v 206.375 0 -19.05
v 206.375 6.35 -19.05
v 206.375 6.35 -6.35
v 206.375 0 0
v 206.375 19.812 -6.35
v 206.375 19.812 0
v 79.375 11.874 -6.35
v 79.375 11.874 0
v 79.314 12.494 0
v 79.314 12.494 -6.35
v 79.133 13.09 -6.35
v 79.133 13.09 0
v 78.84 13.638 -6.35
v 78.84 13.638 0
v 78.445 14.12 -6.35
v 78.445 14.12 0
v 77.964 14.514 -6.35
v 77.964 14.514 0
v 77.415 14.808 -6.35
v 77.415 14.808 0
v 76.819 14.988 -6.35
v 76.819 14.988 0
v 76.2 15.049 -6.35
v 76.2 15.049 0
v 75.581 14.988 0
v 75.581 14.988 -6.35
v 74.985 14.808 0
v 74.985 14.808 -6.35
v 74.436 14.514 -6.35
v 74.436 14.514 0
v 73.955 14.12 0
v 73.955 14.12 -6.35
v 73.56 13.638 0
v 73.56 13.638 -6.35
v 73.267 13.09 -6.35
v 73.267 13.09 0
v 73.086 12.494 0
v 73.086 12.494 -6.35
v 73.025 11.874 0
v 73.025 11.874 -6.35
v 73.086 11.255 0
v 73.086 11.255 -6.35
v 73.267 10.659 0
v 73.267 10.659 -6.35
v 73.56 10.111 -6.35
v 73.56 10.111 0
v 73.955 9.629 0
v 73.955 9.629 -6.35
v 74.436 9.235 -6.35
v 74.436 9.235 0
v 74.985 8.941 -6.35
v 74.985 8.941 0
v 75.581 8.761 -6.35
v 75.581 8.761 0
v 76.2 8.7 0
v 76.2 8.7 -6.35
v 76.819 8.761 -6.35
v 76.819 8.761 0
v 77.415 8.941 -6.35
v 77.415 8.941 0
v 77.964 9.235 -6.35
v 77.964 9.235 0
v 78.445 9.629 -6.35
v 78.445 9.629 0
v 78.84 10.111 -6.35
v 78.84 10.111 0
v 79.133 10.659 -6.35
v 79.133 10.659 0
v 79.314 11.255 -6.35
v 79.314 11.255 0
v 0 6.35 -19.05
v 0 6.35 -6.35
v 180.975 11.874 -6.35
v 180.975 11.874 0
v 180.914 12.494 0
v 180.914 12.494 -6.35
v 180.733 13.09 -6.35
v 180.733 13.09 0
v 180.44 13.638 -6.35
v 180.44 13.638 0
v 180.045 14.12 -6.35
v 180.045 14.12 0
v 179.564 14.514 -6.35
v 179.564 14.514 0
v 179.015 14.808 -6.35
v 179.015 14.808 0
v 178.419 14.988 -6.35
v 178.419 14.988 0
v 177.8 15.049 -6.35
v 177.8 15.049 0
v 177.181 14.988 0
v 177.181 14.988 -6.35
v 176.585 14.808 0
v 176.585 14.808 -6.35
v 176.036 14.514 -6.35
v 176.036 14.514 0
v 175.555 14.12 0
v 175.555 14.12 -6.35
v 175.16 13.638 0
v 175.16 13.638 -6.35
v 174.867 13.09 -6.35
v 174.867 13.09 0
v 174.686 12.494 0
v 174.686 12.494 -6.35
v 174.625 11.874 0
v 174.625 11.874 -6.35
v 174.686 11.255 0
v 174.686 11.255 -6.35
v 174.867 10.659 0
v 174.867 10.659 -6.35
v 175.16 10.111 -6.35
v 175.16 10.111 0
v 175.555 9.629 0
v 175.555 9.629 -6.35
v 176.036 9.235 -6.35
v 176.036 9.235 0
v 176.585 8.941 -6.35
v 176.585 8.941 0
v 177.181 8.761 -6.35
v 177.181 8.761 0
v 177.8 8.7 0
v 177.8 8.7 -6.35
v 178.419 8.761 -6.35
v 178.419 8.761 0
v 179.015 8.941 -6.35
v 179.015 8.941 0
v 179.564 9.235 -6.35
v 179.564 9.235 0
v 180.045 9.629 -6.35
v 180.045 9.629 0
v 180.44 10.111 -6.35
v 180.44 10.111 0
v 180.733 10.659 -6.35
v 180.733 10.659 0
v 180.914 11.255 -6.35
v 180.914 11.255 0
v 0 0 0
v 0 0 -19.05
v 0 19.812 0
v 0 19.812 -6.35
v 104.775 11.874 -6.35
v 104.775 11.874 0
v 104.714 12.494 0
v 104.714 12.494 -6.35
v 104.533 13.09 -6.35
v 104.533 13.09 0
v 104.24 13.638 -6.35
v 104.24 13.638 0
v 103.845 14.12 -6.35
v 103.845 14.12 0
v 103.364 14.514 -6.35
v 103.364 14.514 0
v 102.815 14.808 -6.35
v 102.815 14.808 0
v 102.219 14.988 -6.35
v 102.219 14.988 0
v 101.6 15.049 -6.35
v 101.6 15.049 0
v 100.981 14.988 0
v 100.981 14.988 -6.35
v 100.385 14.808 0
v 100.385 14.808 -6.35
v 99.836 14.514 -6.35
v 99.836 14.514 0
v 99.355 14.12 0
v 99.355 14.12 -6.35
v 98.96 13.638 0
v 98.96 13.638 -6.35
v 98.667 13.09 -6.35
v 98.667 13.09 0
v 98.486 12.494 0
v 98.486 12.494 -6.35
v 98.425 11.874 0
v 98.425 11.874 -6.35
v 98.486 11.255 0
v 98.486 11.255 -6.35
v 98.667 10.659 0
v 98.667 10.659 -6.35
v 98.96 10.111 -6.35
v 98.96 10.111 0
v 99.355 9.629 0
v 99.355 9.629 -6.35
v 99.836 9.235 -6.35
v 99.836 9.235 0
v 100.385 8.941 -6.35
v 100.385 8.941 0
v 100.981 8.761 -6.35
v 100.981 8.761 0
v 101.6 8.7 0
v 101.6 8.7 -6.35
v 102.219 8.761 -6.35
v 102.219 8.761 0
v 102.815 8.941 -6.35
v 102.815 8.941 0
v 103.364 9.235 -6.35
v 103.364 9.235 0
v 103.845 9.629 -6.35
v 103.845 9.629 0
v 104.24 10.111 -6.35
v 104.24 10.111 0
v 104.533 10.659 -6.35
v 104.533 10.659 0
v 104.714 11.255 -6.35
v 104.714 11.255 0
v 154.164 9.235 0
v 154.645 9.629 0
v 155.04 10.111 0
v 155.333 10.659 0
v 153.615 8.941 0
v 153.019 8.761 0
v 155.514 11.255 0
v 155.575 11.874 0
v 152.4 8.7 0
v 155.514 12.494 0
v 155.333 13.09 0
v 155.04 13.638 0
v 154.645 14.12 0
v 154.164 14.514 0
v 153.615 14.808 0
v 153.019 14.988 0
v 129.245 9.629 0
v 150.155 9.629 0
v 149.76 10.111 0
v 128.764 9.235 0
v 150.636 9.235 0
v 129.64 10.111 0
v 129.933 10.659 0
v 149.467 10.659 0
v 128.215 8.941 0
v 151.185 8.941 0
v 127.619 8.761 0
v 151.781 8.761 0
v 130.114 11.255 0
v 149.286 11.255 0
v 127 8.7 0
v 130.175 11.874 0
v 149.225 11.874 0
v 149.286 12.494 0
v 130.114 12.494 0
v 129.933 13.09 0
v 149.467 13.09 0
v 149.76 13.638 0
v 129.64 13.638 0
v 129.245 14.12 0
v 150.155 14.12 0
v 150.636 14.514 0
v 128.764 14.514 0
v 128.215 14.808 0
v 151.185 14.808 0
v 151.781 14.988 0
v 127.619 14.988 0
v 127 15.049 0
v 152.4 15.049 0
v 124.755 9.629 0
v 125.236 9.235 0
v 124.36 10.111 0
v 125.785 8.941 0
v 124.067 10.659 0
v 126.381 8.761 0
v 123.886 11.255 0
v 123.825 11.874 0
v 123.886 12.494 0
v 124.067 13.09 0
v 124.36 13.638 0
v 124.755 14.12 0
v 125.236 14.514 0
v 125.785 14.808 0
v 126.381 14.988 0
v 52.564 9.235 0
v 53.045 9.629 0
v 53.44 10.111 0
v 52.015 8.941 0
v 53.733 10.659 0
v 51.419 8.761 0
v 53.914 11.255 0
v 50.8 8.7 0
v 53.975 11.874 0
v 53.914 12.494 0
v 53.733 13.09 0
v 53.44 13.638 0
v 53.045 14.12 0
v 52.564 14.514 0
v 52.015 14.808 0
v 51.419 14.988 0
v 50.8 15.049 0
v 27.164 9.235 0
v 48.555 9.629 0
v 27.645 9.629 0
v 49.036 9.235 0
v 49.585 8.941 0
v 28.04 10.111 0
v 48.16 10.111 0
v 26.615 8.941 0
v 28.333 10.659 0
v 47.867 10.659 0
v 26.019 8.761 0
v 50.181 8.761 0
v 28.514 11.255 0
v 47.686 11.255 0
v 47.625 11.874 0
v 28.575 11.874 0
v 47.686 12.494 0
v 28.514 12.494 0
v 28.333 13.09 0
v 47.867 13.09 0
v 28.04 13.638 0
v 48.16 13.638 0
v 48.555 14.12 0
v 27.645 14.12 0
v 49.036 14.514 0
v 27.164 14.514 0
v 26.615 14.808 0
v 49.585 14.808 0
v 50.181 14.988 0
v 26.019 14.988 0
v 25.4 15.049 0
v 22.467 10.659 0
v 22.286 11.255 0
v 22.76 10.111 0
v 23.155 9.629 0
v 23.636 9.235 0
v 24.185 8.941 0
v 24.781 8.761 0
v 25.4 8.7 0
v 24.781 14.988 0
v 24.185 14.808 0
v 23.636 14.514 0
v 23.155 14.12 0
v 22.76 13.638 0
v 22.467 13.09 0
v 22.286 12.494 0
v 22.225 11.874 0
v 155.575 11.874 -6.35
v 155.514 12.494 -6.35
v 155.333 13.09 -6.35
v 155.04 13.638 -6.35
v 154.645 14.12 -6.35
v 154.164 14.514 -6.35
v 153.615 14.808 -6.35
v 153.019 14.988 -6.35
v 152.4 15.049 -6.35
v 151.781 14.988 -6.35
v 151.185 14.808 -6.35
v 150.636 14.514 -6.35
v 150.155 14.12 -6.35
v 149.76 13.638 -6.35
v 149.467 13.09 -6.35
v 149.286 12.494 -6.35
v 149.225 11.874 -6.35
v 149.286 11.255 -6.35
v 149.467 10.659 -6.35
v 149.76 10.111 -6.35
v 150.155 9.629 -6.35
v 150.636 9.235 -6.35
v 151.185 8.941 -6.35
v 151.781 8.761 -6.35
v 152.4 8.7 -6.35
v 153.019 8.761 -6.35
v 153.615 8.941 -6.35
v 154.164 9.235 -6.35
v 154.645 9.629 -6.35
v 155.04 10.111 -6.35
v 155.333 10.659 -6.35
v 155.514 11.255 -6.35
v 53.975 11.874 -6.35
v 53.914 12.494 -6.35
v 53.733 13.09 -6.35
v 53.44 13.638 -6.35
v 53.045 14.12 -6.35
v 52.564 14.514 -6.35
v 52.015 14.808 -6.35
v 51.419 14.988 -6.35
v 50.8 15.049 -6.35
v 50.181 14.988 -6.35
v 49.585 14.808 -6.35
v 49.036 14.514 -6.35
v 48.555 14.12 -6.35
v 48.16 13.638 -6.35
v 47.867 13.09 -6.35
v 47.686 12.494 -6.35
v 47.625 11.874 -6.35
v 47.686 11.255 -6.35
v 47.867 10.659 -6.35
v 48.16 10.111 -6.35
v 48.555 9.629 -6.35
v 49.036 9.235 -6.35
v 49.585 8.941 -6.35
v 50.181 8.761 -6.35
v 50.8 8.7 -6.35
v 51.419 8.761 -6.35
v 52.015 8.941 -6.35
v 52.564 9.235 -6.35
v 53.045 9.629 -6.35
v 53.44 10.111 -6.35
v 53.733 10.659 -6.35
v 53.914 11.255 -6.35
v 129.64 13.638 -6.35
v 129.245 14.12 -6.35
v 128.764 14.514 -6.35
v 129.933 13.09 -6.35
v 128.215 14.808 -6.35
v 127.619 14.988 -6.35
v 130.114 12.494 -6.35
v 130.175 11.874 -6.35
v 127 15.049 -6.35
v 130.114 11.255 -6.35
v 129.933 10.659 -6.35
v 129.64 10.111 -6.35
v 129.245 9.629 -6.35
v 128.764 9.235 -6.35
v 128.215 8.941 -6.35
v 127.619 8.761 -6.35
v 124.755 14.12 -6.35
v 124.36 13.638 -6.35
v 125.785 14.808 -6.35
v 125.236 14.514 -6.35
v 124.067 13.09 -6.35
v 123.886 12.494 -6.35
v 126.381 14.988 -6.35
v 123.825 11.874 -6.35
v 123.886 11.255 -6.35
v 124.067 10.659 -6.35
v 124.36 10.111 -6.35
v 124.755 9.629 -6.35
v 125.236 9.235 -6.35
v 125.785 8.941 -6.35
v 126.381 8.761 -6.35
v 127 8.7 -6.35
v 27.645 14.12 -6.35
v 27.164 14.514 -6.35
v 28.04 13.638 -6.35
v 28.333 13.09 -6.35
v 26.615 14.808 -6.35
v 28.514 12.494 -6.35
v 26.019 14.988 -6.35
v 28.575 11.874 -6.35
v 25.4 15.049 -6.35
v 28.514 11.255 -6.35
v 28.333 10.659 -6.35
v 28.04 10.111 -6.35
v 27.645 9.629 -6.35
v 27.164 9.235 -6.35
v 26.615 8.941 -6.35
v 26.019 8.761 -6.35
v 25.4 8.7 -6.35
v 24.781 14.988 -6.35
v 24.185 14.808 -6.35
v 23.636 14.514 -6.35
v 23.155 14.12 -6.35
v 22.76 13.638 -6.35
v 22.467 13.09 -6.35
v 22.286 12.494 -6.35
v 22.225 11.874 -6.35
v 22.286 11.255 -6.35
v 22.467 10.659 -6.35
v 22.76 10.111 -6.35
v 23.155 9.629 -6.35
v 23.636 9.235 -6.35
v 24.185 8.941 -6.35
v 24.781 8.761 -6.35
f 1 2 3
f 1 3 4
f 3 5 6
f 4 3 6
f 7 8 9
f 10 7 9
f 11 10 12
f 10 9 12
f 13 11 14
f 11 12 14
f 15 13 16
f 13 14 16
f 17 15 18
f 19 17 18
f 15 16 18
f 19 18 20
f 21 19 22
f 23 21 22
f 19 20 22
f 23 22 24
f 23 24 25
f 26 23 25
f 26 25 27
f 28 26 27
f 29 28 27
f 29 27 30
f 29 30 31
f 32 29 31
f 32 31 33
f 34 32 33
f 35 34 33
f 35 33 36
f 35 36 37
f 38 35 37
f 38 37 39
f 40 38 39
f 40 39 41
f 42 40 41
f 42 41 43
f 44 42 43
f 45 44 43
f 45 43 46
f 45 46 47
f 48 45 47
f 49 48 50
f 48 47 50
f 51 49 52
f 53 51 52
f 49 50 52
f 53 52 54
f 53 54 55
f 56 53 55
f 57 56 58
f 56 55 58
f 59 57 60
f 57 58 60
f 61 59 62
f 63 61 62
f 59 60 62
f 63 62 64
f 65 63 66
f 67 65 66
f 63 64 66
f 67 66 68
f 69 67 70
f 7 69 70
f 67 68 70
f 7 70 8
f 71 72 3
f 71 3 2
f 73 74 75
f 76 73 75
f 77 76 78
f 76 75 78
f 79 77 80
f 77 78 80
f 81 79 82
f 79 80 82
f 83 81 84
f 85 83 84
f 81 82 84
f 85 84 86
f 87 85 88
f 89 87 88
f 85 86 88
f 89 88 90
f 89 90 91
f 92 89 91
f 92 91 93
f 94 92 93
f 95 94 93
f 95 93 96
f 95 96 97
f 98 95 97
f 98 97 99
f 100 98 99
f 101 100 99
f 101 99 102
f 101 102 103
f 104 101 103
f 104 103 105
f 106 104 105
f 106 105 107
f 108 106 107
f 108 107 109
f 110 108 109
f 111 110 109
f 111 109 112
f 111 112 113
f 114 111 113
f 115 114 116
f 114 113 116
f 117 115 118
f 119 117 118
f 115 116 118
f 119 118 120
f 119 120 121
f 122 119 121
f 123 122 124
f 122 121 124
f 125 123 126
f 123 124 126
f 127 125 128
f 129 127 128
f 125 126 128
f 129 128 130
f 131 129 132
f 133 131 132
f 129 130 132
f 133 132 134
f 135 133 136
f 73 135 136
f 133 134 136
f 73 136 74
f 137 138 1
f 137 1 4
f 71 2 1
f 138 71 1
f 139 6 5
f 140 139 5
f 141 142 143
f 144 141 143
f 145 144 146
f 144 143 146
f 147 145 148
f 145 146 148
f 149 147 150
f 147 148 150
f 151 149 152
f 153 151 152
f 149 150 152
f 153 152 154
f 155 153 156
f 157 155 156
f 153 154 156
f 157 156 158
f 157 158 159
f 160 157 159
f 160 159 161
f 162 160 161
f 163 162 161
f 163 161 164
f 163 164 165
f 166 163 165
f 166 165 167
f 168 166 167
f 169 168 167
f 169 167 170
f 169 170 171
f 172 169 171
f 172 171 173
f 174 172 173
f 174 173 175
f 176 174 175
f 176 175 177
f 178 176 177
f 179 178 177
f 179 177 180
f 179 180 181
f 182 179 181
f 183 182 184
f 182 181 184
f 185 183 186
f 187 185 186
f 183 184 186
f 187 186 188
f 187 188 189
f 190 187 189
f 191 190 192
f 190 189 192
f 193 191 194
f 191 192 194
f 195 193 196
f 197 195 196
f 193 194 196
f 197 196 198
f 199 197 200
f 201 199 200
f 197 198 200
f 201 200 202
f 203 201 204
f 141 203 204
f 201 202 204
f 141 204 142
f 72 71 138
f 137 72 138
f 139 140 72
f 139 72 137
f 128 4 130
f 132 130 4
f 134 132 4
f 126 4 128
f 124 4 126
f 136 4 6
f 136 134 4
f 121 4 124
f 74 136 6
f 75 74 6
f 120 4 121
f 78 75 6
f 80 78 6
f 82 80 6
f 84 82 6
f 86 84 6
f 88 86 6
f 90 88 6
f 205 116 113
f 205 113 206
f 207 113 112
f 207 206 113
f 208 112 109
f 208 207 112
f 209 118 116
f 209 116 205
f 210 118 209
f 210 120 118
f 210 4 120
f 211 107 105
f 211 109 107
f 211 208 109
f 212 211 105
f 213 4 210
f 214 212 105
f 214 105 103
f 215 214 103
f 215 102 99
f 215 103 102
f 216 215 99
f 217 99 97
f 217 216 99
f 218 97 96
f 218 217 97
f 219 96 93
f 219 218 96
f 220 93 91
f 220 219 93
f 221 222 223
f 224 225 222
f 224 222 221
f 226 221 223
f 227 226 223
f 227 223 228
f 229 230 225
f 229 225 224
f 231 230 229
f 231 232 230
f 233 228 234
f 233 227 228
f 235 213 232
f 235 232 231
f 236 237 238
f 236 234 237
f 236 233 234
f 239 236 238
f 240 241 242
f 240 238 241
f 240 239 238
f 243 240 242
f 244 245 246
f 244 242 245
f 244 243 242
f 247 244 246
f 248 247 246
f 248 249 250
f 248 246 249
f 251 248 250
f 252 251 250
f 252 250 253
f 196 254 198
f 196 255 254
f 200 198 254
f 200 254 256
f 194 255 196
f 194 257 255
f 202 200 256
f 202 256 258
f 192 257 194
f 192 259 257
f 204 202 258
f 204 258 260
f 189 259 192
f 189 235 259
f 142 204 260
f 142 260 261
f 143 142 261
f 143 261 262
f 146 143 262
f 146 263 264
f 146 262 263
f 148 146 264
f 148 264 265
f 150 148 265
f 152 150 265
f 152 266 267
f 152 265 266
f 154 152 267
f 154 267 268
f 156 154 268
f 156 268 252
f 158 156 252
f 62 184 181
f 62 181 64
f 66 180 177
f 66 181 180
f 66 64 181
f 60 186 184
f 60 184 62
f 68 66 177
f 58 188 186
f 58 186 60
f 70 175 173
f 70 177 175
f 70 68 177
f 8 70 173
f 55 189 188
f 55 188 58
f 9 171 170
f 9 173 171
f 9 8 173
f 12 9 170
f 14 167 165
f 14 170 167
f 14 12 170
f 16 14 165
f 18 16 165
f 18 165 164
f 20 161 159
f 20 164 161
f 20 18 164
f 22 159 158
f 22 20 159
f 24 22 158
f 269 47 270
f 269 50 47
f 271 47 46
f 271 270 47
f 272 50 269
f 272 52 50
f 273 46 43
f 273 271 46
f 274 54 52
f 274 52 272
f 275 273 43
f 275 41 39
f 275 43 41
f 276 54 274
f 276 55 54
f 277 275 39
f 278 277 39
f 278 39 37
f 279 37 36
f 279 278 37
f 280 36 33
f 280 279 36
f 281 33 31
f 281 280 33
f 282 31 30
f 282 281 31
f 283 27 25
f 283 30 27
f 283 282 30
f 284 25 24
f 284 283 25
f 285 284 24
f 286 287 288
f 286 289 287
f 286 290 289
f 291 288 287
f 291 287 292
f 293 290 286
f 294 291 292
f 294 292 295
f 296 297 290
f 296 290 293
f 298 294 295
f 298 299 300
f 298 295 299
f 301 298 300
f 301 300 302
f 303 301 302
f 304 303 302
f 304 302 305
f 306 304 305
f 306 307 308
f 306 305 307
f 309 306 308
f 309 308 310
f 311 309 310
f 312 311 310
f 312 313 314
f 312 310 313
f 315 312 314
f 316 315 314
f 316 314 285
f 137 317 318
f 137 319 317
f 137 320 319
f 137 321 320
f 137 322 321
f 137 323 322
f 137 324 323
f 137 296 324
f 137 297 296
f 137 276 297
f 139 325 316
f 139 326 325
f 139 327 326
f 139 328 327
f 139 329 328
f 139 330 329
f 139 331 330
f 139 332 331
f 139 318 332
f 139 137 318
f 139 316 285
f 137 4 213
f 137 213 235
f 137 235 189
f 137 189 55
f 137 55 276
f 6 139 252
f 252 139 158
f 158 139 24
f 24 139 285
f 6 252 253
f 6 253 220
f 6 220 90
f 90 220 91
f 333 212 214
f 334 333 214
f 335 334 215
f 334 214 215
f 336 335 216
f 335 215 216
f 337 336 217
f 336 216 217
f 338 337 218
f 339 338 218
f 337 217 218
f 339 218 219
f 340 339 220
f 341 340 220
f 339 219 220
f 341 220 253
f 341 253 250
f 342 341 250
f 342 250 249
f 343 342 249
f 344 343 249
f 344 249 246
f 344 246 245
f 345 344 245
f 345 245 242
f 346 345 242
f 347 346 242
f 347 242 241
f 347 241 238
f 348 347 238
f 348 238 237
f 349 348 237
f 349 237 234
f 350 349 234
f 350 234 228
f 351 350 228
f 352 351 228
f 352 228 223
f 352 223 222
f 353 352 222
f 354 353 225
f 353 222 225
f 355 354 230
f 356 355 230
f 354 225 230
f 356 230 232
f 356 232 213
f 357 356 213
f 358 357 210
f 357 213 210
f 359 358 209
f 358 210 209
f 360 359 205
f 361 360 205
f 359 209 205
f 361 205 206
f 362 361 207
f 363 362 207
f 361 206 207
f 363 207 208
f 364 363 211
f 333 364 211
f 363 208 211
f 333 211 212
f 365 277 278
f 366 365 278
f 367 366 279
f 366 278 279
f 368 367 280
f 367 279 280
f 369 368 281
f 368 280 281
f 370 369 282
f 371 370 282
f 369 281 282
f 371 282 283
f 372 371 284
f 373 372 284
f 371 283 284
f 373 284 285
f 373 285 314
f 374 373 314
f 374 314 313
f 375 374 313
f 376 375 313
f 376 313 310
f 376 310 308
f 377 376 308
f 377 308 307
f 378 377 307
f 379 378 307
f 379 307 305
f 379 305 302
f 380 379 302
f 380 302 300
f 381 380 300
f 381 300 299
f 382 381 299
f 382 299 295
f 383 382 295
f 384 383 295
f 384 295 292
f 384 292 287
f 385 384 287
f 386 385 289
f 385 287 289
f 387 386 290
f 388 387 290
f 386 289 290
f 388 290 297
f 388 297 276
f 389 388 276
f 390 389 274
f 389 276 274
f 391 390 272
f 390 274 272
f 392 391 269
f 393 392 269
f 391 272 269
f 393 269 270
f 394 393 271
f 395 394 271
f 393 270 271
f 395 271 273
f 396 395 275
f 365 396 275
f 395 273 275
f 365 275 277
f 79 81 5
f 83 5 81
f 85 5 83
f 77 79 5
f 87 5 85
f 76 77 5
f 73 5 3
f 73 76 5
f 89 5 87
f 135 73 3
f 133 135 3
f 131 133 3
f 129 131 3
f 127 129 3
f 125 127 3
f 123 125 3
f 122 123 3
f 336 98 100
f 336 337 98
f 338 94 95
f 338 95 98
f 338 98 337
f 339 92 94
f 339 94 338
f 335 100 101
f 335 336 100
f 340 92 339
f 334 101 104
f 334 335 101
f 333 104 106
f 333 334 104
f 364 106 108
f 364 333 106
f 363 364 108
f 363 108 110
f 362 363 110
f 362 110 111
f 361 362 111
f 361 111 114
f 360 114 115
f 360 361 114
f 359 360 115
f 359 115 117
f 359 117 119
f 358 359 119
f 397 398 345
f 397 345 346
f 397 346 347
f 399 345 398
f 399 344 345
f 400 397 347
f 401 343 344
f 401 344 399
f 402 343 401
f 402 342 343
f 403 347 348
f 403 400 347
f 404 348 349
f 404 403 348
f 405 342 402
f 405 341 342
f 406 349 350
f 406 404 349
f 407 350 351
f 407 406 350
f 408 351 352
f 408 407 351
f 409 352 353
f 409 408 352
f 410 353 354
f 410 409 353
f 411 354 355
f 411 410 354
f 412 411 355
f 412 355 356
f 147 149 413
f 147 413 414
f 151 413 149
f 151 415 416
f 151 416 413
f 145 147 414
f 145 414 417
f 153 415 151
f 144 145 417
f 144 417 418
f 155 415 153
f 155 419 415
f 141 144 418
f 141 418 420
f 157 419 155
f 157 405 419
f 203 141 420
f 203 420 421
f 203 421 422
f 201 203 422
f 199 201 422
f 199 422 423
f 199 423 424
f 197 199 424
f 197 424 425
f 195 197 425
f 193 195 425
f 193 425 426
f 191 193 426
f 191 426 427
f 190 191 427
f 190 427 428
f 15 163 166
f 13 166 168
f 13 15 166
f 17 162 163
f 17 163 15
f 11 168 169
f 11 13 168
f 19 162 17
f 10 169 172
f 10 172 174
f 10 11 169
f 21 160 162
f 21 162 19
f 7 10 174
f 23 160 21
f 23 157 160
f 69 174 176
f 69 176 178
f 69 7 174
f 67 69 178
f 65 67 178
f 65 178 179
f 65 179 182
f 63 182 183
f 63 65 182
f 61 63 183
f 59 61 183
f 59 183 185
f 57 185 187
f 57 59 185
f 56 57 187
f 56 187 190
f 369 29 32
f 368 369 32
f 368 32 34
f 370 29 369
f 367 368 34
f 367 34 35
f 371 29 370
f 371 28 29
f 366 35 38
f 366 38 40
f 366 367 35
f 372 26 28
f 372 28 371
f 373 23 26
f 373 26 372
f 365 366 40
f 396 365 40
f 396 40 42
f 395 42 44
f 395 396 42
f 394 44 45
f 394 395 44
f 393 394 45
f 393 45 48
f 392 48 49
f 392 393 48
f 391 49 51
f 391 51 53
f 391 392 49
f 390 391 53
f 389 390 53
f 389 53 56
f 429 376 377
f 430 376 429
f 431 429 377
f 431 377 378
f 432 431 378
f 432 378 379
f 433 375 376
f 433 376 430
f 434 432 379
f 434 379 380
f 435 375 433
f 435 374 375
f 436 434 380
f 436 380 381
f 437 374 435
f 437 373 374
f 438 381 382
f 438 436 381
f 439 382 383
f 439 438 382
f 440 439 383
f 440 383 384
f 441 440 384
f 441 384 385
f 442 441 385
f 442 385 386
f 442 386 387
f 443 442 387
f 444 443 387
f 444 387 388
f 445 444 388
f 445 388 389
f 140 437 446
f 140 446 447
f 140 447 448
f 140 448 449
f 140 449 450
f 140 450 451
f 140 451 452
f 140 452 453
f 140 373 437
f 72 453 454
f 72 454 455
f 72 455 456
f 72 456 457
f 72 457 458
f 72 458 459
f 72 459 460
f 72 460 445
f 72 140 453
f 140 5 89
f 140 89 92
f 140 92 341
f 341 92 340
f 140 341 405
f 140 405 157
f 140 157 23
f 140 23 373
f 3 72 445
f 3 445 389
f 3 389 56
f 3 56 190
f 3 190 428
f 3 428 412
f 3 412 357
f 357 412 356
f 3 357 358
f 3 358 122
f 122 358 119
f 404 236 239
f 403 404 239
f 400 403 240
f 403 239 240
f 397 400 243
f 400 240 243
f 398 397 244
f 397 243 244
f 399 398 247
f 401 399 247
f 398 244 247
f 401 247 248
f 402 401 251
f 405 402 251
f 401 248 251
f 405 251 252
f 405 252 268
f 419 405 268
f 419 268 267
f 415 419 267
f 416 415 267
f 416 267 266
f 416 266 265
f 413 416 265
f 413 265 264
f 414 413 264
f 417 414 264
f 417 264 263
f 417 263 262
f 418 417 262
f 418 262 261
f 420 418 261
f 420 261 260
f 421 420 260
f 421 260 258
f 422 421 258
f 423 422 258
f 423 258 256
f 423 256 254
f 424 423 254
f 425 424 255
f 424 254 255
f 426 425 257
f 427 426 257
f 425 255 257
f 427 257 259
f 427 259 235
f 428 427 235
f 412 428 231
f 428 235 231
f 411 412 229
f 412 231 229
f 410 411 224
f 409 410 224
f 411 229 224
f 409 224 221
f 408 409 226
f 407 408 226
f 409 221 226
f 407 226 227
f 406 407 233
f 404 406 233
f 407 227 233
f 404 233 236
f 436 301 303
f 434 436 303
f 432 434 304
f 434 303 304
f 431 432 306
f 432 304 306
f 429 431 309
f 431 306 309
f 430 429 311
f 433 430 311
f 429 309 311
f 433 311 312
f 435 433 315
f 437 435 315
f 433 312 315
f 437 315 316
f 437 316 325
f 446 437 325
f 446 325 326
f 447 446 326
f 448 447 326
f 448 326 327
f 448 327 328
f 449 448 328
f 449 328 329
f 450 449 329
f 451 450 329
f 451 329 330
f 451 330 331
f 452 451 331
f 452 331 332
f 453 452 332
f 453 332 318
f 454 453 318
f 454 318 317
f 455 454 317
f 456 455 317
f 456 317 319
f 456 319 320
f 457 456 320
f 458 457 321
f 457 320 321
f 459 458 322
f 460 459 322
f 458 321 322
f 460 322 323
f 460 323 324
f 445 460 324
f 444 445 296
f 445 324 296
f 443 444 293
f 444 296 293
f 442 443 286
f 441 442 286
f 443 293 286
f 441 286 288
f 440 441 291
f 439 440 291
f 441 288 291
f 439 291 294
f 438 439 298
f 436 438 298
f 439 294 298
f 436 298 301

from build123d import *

# Parameters (mm, degrees)
BOSS_EXTRUDE1_DEPTH = 206.375
SKETCH2_R           = 3.175
CUT_EXTRUDE1_DEPTH  = 209.19716249
LPATTERN1_COUNT     = 7
LPATTERN1_PITCH     = 25.4


with BuildPart() as part:
    # Sketch1 → Boss-Extrude1 (new body)
    with BuildSketch(Plane(origin=(0, 0, 0), x_dir=(0, 0, -1), z_dir=(1, 0, 0))):
        Polygon((0, 0), (0, 19.812), (6.35, 19.812), (6.35, 6.35), (19.05, 6.35), (19.05, 0), align=None)
    extrude(amount=BOSS_EXTRUDE1_DEPTH)

    # Sketch2 → Cut-Extrude1 (cut, through all)
    with BuildSketch(Plane.XY):
        with Locations((25.4, 11.8745)):
            Circle(SKETCH2_R)
    cut_extrude1 = extrude(amount=-CUT_EXTRUDE1_DEPTH, mode=Mode.SUBTRACT)

    # LPattern1: Cut-Extrude1 ×7
    with Locations(*[(i * LPATTERN1_PITCH, 0, 0) for i in range(1, LPATTERN1_COUNT)]):
        add(cut_extrude1, mode=Mode.SUBTRACT)


solid = part.part
